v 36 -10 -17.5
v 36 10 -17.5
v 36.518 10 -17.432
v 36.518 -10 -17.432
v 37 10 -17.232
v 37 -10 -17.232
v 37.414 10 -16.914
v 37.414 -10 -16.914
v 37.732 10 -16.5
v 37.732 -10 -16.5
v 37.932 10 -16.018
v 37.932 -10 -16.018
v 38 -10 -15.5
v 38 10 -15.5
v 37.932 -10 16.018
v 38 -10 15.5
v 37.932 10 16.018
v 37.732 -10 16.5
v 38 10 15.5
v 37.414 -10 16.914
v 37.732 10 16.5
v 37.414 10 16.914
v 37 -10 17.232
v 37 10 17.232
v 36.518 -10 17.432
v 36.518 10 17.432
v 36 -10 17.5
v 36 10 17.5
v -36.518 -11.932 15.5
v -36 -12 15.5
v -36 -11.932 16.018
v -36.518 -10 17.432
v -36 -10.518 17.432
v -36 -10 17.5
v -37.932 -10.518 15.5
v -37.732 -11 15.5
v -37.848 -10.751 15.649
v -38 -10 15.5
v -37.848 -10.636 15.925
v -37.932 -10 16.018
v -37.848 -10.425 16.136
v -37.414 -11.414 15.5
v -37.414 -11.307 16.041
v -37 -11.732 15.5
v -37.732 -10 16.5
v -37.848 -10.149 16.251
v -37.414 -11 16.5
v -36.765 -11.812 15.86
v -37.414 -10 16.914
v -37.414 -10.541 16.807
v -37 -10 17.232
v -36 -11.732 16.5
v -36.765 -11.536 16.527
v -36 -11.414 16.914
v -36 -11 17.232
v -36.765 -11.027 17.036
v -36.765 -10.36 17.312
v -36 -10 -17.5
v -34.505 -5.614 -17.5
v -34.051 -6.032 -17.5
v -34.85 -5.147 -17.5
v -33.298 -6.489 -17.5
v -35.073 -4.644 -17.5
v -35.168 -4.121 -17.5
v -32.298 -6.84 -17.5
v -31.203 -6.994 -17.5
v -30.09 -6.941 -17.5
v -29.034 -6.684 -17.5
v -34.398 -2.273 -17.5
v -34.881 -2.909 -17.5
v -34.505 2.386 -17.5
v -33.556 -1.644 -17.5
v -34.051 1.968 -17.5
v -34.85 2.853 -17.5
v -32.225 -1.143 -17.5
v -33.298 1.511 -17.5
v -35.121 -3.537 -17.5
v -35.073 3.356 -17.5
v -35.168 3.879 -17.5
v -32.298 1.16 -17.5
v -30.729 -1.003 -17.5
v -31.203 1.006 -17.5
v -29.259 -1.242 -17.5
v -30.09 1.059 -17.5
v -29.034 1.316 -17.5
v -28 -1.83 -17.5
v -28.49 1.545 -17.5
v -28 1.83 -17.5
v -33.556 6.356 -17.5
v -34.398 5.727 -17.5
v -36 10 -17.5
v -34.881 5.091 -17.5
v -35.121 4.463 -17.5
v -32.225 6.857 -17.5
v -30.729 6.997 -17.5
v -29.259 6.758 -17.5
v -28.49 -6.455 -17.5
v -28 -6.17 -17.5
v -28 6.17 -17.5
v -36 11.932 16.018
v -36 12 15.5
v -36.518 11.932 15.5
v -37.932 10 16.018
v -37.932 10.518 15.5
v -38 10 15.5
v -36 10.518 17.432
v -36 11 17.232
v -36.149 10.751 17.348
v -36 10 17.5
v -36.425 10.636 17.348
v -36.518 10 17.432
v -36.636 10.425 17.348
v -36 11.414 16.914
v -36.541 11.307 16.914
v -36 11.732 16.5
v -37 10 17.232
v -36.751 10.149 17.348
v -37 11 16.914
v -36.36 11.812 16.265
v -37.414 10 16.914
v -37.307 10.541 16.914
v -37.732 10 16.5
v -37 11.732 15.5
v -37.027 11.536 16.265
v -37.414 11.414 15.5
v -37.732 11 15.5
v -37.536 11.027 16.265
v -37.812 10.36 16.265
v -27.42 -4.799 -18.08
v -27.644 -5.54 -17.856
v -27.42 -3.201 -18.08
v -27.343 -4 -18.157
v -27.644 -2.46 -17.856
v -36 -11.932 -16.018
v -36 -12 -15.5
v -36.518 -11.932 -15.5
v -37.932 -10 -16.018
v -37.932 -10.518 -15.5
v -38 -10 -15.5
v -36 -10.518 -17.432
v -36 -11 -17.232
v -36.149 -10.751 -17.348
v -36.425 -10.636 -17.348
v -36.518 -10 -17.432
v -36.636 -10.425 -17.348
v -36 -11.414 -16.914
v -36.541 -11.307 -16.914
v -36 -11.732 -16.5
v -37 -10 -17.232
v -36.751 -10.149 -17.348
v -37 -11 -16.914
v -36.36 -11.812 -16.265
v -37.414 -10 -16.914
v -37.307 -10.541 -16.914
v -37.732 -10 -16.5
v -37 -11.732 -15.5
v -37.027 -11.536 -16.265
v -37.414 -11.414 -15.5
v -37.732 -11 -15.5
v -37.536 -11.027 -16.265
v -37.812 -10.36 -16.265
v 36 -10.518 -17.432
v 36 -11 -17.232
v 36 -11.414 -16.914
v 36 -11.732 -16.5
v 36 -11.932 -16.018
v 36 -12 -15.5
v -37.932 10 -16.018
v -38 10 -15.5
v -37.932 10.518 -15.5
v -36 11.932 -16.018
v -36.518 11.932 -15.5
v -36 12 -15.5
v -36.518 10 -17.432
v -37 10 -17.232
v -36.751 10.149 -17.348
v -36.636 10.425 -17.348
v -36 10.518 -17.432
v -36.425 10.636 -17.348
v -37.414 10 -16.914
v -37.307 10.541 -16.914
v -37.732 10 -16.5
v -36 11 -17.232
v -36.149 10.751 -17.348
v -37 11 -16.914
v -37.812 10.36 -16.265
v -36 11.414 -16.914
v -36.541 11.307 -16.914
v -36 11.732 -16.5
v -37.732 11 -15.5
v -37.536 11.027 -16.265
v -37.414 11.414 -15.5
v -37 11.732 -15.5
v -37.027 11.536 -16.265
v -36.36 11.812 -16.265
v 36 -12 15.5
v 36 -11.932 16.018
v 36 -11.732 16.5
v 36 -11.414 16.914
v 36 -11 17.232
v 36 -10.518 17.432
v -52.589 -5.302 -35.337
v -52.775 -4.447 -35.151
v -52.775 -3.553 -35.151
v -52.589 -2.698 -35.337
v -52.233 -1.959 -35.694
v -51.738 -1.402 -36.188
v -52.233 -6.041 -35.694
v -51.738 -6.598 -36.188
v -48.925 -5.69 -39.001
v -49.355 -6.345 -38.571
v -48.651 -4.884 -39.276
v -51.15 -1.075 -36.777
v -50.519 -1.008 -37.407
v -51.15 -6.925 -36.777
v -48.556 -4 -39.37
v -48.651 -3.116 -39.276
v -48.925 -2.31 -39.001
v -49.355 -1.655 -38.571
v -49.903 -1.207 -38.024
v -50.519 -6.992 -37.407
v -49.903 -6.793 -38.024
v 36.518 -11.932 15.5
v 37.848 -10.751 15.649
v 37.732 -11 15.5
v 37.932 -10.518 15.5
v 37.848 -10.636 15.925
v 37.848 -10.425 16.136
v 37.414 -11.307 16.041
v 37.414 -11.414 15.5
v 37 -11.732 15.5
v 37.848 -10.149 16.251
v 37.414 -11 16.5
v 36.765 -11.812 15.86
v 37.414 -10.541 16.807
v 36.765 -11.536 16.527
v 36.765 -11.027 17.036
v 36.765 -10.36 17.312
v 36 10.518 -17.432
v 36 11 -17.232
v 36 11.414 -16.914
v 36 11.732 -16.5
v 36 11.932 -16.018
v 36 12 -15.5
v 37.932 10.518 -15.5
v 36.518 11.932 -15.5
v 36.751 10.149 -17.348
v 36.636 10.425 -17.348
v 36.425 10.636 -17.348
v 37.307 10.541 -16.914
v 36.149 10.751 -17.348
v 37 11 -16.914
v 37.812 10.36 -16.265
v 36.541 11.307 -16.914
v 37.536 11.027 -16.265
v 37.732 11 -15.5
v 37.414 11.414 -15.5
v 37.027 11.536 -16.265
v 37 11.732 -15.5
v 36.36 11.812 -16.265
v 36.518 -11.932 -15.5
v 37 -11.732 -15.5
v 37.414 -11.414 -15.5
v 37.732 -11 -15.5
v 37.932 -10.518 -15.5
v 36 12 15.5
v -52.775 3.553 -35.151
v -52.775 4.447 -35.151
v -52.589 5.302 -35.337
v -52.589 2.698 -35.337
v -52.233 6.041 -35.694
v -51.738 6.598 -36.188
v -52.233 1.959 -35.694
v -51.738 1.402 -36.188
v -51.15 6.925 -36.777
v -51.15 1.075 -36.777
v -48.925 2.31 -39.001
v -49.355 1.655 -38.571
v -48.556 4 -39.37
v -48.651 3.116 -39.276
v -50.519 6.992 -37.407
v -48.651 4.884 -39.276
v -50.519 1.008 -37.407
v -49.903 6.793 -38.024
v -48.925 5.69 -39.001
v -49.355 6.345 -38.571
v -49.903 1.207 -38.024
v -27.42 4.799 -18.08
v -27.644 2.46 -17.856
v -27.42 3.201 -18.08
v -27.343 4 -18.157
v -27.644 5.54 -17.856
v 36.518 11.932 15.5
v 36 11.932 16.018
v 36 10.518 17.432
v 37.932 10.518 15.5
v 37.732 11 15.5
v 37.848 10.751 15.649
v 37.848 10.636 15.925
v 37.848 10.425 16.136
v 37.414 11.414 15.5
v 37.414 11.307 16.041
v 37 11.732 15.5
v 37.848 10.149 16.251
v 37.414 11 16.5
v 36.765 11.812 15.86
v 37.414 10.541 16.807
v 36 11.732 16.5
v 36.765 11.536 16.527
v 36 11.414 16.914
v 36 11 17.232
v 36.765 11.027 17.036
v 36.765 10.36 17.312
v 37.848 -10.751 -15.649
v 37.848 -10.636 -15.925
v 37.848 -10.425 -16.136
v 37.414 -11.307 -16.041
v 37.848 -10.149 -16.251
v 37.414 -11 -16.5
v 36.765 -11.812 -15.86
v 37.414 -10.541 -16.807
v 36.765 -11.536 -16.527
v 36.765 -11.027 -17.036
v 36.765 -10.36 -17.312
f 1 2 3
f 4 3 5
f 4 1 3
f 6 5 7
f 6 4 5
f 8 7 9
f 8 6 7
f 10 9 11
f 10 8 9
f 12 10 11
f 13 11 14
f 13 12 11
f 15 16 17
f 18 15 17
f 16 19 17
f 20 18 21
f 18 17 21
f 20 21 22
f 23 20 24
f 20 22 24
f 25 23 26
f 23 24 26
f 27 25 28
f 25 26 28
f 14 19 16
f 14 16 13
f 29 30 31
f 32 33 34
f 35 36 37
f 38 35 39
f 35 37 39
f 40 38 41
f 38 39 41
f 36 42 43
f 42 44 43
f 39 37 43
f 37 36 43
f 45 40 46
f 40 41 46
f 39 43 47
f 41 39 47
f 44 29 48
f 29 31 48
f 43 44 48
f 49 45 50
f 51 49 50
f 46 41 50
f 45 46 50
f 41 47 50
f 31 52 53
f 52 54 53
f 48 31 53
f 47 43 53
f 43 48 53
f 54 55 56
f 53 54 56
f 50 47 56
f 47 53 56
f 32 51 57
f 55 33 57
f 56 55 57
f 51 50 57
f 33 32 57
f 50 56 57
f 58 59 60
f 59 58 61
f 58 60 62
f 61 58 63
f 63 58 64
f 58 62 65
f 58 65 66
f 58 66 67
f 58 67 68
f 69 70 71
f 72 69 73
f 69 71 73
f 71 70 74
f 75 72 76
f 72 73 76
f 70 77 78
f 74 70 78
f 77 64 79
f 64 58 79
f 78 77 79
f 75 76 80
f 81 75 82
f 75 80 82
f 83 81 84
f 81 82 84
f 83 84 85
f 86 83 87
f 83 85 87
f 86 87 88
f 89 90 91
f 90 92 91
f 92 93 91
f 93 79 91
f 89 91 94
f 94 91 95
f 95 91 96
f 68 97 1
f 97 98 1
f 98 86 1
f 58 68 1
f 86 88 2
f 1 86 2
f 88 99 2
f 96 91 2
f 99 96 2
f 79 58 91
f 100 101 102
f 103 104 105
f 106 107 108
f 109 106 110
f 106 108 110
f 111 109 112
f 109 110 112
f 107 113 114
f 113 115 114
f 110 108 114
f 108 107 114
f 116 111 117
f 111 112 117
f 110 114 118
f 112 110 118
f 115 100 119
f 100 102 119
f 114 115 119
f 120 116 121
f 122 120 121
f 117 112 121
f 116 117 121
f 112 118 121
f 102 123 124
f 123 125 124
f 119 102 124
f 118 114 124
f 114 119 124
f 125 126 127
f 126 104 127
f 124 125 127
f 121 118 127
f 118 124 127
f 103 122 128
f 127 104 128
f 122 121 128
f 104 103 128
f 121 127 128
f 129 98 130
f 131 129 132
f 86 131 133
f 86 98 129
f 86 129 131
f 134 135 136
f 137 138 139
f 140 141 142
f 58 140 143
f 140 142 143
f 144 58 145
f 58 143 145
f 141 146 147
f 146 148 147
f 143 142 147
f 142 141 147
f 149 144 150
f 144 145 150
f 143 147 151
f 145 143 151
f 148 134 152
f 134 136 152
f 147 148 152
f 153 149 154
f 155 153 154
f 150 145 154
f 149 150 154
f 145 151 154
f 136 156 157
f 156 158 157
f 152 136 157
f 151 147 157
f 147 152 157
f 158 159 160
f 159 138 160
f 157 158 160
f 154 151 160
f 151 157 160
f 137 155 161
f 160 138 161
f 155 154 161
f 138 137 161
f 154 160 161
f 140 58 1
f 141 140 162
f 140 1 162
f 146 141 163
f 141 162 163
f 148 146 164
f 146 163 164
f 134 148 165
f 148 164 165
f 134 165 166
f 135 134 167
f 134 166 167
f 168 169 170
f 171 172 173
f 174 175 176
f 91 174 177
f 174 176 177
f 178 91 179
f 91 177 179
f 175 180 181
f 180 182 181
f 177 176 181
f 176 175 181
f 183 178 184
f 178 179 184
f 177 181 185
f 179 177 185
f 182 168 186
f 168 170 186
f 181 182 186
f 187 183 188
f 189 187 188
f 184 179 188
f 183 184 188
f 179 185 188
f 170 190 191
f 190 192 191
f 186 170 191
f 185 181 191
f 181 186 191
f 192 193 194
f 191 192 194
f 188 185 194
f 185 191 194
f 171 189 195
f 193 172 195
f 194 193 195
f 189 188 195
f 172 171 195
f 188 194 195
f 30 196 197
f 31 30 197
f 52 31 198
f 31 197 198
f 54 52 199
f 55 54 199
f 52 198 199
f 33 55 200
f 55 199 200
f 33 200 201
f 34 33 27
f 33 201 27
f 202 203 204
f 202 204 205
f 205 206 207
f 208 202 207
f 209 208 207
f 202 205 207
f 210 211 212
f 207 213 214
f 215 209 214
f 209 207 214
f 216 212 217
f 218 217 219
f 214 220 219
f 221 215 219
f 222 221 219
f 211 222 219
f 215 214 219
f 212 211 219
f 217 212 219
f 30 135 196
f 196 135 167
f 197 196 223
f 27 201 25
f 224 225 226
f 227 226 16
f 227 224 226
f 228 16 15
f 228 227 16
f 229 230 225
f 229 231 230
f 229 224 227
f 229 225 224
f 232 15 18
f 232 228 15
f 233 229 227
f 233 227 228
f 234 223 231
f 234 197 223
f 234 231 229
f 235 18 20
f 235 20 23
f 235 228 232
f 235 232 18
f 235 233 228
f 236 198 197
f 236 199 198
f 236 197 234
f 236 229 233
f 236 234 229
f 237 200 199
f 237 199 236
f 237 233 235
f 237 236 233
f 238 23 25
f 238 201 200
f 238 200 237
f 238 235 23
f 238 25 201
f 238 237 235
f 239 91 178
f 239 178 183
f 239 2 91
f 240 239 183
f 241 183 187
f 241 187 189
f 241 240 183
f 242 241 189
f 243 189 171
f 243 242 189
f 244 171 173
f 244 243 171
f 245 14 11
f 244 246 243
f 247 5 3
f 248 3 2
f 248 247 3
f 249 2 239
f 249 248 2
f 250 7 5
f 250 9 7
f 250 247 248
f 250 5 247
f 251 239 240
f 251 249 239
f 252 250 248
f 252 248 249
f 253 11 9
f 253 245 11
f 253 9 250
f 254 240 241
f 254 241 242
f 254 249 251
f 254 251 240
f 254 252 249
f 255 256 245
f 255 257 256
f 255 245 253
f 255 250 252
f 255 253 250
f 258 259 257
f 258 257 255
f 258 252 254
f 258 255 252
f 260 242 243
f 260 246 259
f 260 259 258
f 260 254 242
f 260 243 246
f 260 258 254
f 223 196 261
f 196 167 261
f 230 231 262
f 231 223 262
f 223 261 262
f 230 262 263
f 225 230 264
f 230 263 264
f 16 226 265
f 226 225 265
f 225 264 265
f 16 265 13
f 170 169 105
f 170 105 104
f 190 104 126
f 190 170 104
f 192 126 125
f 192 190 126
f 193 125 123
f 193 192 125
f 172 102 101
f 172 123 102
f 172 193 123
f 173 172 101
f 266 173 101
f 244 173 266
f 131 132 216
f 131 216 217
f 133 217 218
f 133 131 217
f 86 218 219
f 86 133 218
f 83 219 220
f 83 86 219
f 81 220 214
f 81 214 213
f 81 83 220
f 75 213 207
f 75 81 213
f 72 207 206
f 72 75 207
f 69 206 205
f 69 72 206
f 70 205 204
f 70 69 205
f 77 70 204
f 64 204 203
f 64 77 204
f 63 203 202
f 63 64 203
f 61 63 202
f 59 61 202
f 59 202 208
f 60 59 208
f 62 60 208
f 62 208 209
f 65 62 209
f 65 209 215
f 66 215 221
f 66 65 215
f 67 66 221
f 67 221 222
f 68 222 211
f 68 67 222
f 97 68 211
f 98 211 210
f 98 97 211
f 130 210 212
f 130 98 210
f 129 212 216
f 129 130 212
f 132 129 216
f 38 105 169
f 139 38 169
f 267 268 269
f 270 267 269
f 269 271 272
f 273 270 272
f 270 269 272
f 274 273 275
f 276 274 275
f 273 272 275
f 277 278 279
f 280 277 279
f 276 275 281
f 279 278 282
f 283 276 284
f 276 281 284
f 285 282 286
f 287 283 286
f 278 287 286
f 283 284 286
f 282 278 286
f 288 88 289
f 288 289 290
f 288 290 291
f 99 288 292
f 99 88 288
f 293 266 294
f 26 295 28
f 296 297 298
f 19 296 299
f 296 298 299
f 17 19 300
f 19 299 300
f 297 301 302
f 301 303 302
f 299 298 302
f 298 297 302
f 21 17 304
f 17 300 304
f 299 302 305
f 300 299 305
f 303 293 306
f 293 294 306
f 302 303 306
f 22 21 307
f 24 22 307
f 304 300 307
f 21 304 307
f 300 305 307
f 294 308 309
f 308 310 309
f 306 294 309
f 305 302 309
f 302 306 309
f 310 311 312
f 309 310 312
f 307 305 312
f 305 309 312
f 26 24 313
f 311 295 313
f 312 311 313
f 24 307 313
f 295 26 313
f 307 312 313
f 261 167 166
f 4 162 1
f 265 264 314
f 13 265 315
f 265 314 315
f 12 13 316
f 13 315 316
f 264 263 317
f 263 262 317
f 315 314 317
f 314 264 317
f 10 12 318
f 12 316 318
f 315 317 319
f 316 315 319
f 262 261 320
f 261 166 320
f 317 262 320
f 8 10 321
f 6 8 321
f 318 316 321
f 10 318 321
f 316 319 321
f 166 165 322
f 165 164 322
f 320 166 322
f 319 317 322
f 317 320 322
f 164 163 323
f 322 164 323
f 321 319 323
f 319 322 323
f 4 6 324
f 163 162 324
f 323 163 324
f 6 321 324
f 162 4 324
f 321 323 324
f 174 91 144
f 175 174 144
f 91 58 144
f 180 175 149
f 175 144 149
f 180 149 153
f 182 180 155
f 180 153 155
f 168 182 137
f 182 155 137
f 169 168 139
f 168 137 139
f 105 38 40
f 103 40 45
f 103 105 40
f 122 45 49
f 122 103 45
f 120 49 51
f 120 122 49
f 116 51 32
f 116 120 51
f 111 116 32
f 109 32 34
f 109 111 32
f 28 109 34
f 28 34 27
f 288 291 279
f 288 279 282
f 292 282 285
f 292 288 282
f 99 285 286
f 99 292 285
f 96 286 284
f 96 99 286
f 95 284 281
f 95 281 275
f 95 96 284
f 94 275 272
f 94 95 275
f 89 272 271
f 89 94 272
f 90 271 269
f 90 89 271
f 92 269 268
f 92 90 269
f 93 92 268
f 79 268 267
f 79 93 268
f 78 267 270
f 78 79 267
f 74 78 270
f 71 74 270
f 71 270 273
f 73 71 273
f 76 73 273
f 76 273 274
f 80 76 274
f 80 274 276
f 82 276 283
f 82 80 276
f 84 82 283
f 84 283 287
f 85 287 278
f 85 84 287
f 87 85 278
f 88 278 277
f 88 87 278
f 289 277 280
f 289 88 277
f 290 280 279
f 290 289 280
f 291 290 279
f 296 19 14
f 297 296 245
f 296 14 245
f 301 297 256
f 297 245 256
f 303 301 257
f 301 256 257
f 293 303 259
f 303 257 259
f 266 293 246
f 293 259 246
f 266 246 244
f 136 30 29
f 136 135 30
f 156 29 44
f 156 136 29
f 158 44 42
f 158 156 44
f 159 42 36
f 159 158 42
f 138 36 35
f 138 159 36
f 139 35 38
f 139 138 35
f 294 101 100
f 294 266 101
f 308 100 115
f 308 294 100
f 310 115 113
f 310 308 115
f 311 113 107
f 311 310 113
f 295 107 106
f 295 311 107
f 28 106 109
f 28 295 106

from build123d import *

# Parameters (mm, degrees)
SKETCH1_W           = 76
SKETCH1_H           = 35
BOSS_EXTRUDE1_DEPTH = 12
SKETCH4_R           = 3
BOSS_EXTRUDE2_DEPTH = 30
FILLET1_R           = 2


with BuildPart() as part:
    # Sketch1 → Boss-Extrude1 (new body, symmetric)
    with BuildSketch(Plane(origin=(0, 0, 0), x_dir=(1, 0, 0), z_dir=(0, 1, 0))):
        Rectangle(SKETCH1_W, SKETCH1_H)
    extrude(amount=BOSS_EXTRUDE1_DEPTH, both=True)

    # Sketch4 → Boss-Extrude2 (add)
    with BuildSketch(Plane(origin=(-22.75, 0, -22.75), x_dir=(0.707106781, 0, -0.707106781), z_dir=(0.707106781, 0, 0.707106781))):
        with Locations((-9.495689014, 4)):
            Circle(SKETCH4_R)
        with Locations((-9.495689014, -4)):
            Circle(SKETCH4_R)
    extrude(amount=-BOSS_EXTRUDE2_DEPTH)

    # Fillet1
    fillet1_edges = [part.edges().sort_by_distance(p)[0] for p in [
        (-38, 12, 0),
        (0, 12, 17.5),
        (38, 12, 0),
        (0, -12, 17.5),
        (-38, -12, 0),
        (0, -12, -17.5),
        (38, -12, 0),
        (38, 0, 17.5),
        (-38, 0, 17.5),
        (-38, 0, -17.5),
        (38, 0, -17.5),
        (0, 12, -17.5),
    ]]
    fillet(fillet1_edges, radius=FILLET1_R)


solid = part.part
